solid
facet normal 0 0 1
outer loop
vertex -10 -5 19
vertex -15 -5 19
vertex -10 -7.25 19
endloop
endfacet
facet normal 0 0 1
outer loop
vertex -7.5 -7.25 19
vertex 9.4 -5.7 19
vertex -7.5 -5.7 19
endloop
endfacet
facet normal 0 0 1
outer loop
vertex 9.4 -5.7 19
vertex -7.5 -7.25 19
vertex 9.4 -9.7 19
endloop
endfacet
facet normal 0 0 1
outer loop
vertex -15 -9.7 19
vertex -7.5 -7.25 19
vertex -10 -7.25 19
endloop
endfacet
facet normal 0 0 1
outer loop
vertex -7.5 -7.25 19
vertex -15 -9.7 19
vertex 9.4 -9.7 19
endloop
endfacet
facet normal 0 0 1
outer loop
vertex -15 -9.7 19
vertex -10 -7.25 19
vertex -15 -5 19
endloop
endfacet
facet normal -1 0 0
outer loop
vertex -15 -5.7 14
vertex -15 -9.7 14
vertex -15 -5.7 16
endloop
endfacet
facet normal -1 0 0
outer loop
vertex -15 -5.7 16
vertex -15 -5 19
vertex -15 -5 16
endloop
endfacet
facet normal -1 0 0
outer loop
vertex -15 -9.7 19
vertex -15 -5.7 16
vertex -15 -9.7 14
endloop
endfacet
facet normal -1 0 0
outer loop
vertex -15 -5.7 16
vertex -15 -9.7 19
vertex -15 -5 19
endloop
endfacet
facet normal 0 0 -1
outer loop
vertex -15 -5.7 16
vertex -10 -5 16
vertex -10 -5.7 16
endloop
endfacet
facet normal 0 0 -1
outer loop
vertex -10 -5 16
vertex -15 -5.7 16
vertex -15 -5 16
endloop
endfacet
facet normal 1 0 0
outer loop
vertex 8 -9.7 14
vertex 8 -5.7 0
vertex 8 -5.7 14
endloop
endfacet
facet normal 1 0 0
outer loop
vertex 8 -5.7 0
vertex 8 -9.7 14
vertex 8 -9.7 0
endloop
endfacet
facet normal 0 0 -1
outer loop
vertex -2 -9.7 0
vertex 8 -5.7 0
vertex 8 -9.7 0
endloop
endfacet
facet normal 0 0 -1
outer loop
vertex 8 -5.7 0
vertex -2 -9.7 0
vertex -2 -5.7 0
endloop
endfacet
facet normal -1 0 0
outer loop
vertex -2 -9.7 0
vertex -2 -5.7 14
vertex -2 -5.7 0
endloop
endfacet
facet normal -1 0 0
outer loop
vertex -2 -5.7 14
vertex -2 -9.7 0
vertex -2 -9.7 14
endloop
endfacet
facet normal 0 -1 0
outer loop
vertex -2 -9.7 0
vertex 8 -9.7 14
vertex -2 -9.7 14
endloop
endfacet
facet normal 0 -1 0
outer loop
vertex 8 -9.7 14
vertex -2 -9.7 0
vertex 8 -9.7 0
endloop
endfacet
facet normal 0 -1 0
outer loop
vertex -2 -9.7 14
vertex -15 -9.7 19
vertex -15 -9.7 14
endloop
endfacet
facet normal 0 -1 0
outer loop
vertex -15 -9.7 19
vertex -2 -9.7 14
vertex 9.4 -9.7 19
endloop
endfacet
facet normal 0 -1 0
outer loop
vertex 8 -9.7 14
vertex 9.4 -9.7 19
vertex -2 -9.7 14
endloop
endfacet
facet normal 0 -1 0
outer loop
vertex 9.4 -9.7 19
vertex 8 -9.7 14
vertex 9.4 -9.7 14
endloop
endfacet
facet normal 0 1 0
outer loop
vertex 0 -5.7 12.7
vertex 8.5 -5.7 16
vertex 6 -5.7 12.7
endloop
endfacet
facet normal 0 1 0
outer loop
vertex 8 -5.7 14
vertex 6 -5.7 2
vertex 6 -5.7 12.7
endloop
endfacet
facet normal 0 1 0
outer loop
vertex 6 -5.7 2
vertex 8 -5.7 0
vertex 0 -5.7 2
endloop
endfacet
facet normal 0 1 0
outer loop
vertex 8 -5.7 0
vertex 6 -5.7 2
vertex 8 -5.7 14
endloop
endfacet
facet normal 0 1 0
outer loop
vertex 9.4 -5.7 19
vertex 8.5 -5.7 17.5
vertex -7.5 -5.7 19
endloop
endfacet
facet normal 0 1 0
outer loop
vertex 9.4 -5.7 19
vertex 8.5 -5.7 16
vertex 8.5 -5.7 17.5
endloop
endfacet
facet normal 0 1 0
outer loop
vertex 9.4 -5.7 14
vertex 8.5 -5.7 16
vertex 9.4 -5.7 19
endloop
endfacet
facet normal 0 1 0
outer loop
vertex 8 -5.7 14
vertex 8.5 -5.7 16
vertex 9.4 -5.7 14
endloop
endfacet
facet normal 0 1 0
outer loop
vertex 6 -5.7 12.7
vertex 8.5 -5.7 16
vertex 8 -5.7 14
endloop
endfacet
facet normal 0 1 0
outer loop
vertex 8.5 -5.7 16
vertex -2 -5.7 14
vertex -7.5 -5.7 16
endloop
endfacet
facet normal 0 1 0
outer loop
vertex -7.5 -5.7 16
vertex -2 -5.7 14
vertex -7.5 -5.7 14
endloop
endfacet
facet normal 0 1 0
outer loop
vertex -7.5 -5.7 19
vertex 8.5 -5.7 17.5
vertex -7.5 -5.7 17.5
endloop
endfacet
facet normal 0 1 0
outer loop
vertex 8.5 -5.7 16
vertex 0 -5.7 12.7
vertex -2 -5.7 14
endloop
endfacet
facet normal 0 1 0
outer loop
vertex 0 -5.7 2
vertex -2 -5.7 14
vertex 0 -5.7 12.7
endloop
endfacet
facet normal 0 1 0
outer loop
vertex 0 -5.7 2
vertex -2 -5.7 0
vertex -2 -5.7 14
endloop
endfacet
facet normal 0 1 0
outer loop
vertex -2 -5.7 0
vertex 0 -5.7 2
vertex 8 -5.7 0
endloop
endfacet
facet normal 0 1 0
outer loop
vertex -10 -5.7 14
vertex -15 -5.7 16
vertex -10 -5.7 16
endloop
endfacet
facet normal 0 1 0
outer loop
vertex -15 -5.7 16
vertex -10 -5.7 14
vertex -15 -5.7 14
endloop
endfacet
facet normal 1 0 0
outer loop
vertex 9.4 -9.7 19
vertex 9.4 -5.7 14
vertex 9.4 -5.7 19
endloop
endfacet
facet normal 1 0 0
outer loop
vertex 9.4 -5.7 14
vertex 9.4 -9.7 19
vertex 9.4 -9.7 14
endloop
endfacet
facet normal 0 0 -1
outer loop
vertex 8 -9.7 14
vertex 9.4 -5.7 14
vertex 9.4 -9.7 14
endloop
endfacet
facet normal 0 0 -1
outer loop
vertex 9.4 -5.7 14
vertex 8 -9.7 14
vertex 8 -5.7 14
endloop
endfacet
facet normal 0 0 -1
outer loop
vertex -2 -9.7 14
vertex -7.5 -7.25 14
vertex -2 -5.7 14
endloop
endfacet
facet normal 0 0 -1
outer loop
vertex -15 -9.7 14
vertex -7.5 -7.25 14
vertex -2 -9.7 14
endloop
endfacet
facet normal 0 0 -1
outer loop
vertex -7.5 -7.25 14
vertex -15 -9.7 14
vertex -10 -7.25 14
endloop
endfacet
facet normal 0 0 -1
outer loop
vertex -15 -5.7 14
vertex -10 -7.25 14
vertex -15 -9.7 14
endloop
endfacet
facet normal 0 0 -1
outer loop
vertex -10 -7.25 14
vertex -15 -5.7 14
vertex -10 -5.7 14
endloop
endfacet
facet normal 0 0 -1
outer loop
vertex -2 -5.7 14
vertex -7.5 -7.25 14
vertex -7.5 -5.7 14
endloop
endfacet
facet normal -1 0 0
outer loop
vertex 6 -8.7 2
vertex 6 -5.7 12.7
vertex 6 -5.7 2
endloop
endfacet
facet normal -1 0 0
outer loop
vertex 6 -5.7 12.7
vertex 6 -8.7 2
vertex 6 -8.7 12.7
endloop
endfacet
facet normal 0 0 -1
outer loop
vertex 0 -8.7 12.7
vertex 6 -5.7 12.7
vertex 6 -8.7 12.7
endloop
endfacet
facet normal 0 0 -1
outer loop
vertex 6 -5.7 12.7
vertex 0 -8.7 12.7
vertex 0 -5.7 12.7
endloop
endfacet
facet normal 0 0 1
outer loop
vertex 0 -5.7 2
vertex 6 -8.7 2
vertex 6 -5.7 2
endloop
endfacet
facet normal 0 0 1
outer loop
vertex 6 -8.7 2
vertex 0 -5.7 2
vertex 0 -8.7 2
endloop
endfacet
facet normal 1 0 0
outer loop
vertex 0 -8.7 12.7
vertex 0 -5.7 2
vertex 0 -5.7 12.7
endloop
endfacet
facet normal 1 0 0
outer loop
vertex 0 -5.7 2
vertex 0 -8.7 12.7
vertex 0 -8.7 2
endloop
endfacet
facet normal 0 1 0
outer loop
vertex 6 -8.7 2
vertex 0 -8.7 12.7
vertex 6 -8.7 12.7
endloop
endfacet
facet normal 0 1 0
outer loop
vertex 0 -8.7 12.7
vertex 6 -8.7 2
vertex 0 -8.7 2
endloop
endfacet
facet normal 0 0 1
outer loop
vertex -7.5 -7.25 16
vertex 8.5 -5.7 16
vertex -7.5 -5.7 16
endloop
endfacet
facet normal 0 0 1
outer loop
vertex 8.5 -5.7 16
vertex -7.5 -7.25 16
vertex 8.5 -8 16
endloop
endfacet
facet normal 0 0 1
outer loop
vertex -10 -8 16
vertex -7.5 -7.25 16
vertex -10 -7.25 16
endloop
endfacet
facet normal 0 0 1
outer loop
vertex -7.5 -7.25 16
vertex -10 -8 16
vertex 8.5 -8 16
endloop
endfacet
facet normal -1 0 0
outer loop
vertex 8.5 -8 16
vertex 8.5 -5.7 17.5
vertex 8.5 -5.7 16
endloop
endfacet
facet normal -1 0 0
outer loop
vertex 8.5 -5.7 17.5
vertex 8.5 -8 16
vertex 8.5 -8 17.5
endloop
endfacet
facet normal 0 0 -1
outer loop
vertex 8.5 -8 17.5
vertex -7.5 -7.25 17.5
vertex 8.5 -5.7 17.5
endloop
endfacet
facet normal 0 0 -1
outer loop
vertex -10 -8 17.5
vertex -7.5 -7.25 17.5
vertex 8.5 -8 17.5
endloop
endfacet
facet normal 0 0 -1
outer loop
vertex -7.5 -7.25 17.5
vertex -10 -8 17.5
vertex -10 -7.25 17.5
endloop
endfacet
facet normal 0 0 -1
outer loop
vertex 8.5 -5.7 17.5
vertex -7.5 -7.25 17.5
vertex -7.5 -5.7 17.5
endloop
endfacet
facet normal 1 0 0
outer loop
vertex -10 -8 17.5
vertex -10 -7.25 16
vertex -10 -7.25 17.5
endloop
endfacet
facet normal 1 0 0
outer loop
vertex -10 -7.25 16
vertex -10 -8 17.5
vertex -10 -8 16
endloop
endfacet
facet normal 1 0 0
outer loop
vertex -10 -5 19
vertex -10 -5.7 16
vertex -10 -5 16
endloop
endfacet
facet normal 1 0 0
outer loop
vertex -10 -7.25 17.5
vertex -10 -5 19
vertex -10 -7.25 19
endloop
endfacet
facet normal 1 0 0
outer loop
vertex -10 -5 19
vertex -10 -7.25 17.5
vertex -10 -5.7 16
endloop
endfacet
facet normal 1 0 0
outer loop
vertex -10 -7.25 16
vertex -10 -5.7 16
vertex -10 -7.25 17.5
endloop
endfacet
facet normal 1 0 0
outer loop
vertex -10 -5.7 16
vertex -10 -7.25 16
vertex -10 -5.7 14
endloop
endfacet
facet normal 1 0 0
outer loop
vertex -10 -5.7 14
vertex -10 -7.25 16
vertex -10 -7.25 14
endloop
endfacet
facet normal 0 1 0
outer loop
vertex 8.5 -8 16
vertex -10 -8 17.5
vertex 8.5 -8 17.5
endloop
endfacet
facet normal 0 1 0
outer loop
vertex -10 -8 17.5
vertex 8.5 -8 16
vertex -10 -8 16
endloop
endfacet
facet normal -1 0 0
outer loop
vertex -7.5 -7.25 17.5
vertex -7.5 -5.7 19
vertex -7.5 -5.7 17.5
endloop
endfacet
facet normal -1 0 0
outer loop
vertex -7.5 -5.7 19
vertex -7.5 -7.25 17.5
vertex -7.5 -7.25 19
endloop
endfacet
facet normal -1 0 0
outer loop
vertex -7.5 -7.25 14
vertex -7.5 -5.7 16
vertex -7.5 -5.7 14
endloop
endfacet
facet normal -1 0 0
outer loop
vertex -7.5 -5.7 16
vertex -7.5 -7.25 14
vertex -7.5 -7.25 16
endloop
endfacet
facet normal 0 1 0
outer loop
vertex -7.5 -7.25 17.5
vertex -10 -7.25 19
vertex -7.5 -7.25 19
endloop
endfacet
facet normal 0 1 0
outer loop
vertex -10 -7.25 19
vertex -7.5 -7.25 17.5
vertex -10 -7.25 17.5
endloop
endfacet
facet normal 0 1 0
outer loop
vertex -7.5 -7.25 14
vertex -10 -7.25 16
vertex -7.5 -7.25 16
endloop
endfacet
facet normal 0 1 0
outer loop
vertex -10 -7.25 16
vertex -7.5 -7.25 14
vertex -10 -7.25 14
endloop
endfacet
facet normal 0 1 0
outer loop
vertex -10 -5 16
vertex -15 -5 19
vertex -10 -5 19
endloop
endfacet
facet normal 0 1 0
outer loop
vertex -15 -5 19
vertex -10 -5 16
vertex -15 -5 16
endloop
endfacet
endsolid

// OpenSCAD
$fn = 96;

module pcb() {
    translate([0, - 8, 0]) {
        // tistak
        cube([18.5, 16, 1.5]);
        // zadni kabely
        translate([0, 0.75, - 3]) cube([2.5, 16 - 1.5, 1.5 + 1.5 + 3]);
        // USB port + soucastky
        translate([0, 3, 1.5])cube([19.4, 10, 3.5]);
        // kabely spodni
        translate([- 7, 3, - 7])cube([18.5 + 7, 10, 7]);
        // ledka
        translate([- 3, 8, - 1]) {
            linear_extrude(6.7) circle(d = 3.1);
            linear_extrude(1) circle(d = 4);
        }
    }
}

module connector() {
    w = 17.4;
    translate([0, - w / 2, 0]) {
        // connector
        cube([6, 17.4, 10.7]);
        translate([0, 4, - 3]) cube([6, w - 4 - 2, 3]);
    }
}

module bok() {
    translate([- 2, 17.4 / 2 - 3]) {
        cube([10, 4, 19]);
        d1 = 3.4;
        translate([- (19.6 - 10 + d1), 0, 14]) cube([21 + d1, 4, 5]);
    }
    // kruh kolem ledky
    translate([- 13, 0, 14 + 2]) linear_extrude(3) circle(d = 10);
    // drzak kruhu kolem ledky
    translate([- 15, - 18 / 2, 14 + 2]) cube([6, 18, 3]);
}

module complete() {
    difference() {
        union() {
            bok();
            mirror([0, 1, 0]) bok();
        }
        // pcb + connector
        translate([0, 0, 2]) {
            connector();
            translate([- 10, 0, 14]) pcb();
        }
    }
}

difference() {
//intersection() {
    complete();
    translate([- 20, - 5, - 1])cube([30, 20, 30]);
}
